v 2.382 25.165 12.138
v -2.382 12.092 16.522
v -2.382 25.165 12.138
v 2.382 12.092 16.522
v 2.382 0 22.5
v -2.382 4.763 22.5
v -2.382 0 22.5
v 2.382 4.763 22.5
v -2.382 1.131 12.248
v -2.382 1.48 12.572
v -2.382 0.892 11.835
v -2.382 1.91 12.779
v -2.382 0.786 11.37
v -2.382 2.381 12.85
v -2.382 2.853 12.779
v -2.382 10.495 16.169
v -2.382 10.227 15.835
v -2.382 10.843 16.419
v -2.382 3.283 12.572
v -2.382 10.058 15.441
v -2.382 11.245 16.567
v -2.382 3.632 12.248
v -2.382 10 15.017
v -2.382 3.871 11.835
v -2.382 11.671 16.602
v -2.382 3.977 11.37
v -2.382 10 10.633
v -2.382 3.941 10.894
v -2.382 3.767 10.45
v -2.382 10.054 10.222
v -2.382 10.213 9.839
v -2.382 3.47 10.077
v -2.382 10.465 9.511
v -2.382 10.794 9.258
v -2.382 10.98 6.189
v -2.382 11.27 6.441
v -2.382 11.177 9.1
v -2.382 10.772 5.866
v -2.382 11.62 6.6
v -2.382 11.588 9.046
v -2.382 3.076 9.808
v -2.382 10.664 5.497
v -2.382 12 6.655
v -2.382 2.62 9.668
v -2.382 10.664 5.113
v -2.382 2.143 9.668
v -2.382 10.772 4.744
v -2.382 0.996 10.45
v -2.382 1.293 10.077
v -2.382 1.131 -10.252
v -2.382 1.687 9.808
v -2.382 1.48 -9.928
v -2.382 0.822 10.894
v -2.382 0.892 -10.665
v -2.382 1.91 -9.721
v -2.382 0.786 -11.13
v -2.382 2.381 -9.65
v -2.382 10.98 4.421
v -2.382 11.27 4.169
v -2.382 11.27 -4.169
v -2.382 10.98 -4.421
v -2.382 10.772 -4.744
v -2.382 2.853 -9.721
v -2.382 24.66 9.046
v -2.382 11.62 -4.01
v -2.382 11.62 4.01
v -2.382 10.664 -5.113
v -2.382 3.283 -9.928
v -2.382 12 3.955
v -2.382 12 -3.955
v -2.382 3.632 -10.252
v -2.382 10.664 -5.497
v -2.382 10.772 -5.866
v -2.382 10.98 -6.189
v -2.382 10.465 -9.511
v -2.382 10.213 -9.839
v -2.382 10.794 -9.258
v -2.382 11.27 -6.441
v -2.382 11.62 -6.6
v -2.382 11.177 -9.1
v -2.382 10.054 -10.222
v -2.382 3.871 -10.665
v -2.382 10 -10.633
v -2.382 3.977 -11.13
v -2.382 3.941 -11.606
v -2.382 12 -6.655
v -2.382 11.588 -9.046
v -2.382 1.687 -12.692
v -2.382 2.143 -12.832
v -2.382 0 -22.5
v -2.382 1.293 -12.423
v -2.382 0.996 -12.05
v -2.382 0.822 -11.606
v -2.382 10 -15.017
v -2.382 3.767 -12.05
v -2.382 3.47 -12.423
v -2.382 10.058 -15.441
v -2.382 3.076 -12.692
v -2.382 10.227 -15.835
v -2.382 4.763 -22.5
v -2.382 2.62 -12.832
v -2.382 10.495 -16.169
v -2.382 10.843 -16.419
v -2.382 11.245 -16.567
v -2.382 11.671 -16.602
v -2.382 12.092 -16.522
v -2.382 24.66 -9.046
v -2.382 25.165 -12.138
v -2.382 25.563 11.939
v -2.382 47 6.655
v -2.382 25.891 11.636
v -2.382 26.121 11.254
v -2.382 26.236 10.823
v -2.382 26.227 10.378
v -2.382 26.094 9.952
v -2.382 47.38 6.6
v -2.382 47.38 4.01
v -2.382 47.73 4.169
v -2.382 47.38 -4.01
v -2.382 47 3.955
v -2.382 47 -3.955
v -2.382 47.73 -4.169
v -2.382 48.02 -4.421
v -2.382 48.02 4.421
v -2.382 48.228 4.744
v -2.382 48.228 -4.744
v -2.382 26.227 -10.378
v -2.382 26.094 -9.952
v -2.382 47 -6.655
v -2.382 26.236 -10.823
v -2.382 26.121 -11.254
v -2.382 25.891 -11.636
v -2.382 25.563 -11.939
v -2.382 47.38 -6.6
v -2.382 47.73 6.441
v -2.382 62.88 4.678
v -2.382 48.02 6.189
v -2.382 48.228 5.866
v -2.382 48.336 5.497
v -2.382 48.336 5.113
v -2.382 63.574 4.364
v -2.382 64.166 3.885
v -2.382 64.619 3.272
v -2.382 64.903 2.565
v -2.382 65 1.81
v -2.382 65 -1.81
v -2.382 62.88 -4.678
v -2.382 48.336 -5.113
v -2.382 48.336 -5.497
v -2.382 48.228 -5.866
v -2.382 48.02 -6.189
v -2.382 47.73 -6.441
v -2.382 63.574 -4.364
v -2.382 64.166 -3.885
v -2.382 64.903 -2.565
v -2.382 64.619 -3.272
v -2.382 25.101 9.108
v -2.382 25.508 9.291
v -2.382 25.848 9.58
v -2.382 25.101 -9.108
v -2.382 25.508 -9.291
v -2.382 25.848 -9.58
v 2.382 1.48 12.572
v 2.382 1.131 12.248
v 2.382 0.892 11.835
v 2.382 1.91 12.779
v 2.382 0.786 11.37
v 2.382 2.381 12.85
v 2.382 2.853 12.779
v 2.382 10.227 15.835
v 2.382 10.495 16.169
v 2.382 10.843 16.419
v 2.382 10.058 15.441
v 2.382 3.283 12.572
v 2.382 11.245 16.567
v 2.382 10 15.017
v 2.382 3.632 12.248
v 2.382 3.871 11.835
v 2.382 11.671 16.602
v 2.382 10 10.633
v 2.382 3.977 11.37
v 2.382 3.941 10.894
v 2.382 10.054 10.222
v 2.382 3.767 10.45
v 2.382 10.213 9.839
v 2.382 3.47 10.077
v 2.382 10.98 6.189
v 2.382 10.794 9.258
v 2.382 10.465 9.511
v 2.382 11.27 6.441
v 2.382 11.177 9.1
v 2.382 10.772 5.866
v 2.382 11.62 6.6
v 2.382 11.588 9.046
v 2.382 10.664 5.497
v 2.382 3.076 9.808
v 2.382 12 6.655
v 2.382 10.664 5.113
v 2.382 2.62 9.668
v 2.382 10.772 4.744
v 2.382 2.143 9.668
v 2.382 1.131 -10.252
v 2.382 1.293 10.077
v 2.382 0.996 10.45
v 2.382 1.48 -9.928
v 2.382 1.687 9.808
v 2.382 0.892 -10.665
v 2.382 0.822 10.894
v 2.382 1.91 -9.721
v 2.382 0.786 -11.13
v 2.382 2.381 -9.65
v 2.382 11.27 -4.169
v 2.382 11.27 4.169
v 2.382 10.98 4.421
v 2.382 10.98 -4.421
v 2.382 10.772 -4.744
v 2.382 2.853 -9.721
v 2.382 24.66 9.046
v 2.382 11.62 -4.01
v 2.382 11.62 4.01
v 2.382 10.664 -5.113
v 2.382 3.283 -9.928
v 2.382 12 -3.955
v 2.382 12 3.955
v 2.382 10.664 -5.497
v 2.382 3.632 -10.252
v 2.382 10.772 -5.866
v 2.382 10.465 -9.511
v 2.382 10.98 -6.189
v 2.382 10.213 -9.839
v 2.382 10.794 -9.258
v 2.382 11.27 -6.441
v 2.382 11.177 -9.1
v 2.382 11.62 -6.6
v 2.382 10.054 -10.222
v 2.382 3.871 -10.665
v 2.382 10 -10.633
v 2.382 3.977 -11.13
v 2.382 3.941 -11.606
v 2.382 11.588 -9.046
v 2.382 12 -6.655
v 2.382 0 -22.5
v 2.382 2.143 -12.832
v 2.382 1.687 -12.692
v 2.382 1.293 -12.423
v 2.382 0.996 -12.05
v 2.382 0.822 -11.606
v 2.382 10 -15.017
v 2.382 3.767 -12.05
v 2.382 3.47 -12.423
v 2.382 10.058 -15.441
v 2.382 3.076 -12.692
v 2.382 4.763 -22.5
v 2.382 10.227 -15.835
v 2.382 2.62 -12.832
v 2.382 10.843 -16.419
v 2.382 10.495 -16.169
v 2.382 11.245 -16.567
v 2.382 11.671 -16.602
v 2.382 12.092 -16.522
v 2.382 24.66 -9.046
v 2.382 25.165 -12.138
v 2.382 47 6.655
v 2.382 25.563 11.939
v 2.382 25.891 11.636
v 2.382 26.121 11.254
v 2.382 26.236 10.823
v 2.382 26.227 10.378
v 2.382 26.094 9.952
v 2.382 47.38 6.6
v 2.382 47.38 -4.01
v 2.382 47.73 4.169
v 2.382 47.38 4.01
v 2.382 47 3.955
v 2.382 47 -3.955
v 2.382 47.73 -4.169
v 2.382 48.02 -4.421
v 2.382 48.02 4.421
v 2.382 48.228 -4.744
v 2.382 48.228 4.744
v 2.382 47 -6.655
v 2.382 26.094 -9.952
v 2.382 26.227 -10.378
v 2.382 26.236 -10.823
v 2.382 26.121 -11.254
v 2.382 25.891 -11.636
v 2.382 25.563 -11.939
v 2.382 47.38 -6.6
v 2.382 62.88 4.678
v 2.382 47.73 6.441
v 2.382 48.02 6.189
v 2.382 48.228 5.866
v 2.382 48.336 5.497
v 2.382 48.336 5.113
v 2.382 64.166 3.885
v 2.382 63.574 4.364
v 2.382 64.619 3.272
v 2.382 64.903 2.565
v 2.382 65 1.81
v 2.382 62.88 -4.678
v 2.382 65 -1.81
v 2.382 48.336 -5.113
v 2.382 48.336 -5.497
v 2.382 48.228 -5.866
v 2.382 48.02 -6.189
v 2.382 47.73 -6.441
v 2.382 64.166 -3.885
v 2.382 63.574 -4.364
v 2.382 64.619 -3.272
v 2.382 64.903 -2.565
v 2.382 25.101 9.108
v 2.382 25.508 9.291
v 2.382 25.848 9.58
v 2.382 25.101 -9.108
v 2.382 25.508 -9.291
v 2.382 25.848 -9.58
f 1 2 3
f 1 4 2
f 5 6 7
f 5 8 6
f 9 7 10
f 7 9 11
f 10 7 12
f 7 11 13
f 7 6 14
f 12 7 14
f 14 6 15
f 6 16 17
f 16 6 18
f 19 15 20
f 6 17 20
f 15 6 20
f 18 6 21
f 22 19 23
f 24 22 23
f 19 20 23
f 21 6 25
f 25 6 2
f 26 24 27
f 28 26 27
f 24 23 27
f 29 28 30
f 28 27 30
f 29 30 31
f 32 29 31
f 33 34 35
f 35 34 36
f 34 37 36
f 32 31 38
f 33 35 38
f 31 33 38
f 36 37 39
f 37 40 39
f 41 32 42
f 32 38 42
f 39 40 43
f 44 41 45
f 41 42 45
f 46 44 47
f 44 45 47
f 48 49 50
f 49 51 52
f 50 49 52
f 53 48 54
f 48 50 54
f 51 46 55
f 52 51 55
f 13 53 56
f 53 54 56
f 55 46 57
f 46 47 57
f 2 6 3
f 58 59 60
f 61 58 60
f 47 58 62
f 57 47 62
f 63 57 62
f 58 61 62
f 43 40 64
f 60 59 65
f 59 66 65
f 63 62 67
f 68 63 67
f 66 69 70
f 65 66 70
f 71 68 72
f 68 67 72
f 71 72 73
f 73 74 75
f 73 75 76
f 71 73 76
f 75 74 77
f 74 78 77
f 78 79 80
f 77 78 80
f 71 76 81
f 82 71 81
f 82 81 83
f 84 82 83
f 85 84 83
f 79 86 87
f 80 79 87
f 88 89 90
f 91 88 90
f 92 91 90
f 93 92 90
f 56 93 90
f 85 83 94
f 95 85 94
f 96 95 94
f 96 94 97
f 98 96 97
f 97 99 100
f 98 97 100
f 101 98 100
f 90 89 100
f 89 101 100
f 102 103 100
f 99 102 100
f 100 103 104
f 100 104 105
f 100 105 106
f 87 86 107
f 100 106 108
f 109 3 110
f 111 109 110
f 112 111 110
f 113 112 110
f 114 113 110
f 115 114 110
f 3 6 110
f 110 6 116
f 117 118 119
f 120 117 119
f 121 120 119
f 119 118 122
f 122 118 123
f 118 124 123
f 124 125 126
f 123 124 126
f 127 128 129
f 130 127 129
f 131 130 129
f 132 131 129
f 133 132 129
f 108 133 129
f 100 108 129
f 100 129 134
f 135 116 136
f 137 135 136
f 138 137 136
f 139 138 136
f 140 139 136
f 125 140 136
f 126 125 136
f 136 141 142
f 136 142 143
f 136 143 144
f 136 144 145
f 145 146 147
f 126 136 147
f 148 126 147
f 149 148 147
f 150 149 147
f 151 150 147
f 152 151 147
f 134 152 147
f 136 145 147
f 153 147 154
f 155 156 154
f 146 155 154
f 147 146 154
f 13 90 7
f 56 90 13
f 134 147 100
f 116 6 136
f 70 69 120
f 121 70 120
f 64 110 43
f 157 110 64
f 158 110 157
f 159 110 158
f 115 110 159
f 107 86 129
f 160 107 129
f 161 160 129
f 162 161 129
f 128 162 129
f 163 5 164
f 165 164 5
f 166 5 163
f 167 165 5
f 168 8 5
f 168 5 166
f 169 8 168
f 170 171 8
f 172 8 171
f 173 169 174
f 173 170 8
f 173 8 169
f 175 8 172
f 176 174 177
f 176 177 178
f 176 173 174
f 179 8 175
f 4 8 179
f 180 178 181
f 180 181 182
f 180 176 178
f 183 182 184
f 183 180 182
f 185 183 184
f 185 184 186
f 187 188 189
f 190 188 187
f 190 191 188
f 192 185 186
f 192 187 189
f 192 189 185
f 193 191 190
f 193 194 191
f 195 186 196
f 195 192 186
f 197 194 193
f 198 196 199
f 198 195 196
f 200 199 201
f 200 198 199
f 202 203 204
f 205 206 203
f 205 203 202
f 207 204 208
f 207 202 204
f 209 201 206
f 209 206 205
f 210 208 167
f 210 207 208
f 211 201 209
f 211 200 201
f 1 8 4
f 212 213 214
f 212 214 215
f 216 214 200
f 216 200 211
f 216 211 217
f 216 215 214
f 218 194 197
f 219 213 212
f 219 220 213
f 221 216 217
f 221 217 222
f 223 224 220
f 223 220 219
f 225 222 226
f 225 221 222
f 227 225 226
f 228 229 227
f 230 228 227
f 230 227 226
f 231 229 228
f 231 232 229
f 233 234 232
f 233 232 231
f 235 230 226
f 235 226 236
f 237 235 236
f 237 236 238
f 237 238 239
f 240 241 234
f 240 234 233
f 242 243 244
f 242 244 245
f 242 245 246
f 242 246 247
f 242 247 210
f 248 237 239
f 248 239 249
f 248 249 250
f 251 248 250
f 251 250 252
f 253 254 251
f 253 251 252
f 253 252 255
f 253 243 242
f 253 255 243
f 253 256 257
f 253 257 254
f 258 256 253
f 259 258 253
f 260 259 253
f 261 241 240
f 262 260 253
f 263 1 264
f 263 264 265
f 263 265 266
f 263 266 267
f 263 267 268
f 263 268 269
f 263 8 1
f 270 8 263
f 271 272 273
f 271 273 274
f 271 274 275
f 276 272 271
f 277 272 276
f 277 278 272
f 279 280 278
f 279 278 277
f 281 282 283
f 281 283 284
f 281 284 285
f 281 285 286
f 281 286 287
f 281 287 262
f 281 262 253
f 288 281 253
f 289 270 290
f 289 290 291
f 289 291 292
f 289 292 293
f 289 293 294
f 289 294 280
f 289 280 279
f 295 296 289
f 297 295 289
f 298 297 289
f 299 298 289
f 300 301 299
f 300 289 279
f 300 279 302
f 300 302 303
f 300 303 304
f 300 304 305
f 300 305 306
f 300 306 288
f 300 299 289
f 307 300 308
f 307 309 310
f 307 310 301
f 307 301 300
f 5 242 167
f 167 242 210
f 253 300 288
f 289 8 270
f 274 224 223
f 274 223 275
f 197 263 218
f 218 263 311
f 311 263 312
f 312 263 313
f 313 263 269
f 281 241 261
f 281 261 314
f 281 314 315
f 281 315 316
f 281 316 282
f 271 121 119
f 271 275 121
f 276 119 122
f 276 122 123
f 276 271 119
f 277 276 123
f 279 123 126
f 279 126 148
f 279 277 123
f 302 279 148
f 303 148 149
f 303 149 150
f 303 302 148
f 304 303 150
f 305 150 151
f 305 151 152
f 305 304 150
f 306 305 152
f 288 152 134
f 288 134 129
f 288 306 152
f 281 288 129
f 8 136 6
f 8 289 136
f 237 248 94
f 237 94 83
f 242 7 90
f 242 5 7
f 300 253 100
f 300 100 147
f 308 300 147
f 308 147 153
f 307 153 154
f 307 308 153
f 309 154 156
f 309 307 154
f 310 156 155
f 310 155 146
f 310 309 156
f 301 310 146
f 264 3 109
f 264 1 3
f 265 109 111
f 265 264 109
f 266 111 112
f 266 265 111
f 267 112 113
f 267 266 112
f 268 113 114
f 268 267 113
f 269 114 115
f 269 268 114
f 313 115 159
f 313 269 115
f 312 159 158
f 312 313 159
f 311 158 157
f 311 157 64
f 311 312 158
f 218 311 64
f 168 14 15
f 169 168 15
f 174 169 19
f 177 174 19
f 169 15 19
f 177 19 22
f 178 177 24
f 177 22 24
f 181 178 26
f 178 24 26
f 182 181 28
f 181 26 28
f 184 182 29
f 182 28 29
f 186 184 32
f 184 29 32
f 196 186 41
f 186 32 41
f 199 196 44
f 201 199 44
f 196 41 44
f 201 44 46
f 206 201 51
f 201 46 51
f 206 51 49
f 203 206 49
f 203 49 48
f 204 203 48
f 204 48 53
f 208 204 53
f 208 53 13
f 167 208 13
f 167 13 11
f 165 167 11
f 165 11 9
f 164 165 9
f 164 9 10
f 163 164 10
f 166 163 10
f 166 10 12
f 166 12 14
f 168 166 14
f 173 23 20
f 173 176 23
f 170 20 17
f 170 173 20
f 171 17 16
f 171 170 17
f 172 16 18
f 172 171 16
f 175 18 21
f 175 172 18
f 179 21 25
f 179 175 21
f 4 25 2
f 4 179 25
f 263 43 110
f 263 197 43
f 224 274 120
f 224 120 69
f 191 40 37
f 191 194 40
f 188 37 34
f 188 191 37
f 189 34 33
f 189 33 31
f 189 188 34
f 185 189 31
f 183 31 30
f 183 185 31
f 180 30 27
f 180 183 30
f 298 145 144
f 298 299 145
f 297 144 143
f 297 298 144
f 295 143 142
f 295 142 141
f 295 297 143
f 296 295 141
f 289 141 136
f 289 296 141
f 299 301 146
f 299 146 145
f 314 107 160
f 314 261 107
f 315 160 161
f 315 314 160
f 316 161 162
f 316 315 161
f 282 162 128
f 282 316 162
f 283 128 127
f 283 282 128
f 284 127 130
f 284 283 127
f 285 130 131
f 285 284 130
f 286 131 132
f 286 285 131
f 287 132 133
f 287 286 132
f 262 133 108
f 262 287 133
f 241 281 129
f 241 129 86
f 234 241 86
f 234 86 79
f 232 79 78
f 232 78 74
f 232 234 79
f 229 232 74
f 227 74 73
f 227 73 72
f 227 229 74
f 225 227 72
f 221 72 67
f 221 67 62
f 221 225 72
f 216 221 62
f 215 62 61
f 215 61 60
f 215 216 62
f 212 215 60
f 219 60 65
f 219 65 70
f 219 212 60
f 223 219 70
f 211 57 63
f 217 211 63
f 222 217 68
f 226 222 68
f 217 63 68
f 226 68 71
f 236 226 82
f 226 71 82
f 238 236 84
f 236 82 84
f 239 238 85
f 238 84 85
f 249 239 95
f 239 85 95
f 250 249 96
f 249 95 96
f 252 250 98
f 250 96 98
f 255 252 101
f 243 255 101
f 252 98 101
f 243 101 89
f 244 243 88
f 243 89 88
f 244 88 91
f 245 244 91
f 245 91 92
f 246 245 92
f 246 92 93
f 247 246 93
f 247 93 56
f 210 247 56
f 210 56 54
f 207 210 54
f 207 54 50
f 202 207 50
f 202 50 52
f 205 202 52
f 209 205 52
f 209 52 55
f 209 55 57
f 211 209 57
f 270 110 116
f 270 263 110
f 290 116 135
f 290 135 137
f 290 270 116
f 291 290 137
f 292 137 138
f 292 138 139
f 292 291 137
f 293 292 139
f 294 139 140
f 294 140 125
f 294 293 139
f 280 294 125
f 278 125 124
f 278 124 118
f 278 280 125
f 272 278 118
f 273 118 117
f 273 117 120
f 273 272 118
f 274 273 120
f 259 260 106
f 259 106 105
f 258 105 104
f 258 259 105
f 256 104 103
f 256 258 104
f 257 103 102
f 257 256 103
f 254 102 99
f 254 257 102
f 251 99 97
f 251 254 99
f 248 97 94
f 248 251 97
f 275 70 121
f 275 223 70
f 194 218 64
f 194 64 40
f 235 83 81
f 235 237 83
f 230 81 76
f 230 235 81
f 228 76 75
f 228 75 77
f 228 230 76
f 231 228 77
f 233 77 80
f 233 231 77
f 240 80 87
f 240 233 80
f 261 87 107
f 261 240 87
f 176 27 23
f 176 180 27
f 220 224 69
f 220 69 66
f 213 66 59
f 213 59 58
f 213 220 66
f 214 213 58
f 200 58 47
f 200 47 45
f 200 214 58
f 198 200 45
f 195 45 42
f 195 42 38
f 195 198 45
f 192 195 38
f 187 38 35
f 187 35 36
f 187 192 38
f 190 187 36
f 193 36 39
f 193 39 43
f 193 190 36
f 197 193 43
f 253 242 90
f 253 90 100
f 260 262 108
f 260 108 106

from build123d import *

# Parameters (mm, degrees)
BOSS_EXTRUDE1_DEPTH  = 2.3815
M3_CLEARANCE_HOLE1_D = 3.2


with BuildPart() as part:
    # Sketch1 → Boss-Extrude1 (new body, symmetric)
    with BuildSketch(Plane(origin=(0, 0, 0), x_dir=(0, 0, -1), z_dir=(1, 0, 0))):
        with BuildLine():
            Line((-22.5, 0), (22.5, 0))
            Line((22.5, 0), (22.5, 4.763))
            Line((22.5, 4.763), (4.677891876, 62.879556228))
            ThreePointArc((4.677891876, 62.879556228), (3.593167148, 64.41232965), (1.809725067, 65))
            Line((1.809725067, 65), (-1.809725067, 65))
            ThreePointArc((-1.809725067, 65), (-3.593167148, 64.41232965), (-4.677891876, 62.879556228))
            Line((-4.677891876, 62.879556228), (-22.5, 4.763))
            Line((-22.5, 4.763), (-22.5, 0))
        make_face()
        with BuildLine():
            Line((-3.955008566, 47), (-3.955008566, 12))
            ThreePointArc((-3.955008566, 12), (-5.305008566, 10.65), (-6.655008566, 12))
            Line((-6.655008566, 12), (-6.655008566, 47))
            ThreePointArc((-6.655008566, 47), (-5.305008566, 48.35), (-3.955008566, 47))
        make_face(mode=Mode.SUBTRACT)
        with BuildLine():
            Line((6.655008566, 47), (6.655008566, 12))
            ThreePointArc((6.655008566, 12), (5.305008566, 10.65), (3.955008566, 12))
            Line((3.955008566, 12), (3.955008566, 47))
            ThreePointArc((3.955008566, 47), (5.305008566, 48.35), (6.655008566, 47))
        make_face(mode=Mode.SUBTRACT)
        with BuildLine():
            Line((12.138351874, 25.164576479), (16.522078624, 12.092233924))
            ThreePointArc((16.522078624, 12.092233924), (16.305639712, 10.660437126), (15.016954073, 10))
            Line((15.016954073, 10), (10.633227322, 10))
            ThreePointArc((10.633227322, 10), (9.510695307, 10.464967985), (9.045727322, 11.5875))
            Line((9.045727322, 11.5875), (9.045727322, 24.659842555))
            ThreePointArc((9.045727322, 24.659842555), (10.377521412, 26.226613354), (12.138351874, 25.164576479))
        make_face(mode=Mode.SUBTRACT)
        with BuildLine():
            Line((-9.045727322, 24.659842555), (-9.045727322, 11.5875))
            ThreePointArc((-9.045727322, 11.5875), (-9.510695307, 10.464967985), (-10.633227322, 10))
            Line((-10.633227322, 10), (-15.016954073, 10))
            ThreePointArc((-15.016954073, 10), (-16.305639712, 10.660437126), (-16.522078624, 12.092233924))
            Line((-16.522078624, 12.092233924), (-12.138351874, 25.164576479))
            ThreePointArc((-12.138351874, 25.164576479), (-10.377521412, 26.226613354), (-9.045727322, 24.659842555))
        make_face(mode=Mode.SUBTRACT)
    extrude(amount=BOSS_EXTRUDE1_DEPTH, both=True)

    # M3 Clearance Hole1 (through all)
    with Locations(Plane(origin=(2.3815, 0, 0), x_dir=(0, 0, -1), z_dir=(1, 0, 0))):
        with Locations((-11.25, 2.3815), (11.25, 2.3815)):
            Hole(M3_CLEARANCE_HOLE1_D / 2)


solid = part.part
